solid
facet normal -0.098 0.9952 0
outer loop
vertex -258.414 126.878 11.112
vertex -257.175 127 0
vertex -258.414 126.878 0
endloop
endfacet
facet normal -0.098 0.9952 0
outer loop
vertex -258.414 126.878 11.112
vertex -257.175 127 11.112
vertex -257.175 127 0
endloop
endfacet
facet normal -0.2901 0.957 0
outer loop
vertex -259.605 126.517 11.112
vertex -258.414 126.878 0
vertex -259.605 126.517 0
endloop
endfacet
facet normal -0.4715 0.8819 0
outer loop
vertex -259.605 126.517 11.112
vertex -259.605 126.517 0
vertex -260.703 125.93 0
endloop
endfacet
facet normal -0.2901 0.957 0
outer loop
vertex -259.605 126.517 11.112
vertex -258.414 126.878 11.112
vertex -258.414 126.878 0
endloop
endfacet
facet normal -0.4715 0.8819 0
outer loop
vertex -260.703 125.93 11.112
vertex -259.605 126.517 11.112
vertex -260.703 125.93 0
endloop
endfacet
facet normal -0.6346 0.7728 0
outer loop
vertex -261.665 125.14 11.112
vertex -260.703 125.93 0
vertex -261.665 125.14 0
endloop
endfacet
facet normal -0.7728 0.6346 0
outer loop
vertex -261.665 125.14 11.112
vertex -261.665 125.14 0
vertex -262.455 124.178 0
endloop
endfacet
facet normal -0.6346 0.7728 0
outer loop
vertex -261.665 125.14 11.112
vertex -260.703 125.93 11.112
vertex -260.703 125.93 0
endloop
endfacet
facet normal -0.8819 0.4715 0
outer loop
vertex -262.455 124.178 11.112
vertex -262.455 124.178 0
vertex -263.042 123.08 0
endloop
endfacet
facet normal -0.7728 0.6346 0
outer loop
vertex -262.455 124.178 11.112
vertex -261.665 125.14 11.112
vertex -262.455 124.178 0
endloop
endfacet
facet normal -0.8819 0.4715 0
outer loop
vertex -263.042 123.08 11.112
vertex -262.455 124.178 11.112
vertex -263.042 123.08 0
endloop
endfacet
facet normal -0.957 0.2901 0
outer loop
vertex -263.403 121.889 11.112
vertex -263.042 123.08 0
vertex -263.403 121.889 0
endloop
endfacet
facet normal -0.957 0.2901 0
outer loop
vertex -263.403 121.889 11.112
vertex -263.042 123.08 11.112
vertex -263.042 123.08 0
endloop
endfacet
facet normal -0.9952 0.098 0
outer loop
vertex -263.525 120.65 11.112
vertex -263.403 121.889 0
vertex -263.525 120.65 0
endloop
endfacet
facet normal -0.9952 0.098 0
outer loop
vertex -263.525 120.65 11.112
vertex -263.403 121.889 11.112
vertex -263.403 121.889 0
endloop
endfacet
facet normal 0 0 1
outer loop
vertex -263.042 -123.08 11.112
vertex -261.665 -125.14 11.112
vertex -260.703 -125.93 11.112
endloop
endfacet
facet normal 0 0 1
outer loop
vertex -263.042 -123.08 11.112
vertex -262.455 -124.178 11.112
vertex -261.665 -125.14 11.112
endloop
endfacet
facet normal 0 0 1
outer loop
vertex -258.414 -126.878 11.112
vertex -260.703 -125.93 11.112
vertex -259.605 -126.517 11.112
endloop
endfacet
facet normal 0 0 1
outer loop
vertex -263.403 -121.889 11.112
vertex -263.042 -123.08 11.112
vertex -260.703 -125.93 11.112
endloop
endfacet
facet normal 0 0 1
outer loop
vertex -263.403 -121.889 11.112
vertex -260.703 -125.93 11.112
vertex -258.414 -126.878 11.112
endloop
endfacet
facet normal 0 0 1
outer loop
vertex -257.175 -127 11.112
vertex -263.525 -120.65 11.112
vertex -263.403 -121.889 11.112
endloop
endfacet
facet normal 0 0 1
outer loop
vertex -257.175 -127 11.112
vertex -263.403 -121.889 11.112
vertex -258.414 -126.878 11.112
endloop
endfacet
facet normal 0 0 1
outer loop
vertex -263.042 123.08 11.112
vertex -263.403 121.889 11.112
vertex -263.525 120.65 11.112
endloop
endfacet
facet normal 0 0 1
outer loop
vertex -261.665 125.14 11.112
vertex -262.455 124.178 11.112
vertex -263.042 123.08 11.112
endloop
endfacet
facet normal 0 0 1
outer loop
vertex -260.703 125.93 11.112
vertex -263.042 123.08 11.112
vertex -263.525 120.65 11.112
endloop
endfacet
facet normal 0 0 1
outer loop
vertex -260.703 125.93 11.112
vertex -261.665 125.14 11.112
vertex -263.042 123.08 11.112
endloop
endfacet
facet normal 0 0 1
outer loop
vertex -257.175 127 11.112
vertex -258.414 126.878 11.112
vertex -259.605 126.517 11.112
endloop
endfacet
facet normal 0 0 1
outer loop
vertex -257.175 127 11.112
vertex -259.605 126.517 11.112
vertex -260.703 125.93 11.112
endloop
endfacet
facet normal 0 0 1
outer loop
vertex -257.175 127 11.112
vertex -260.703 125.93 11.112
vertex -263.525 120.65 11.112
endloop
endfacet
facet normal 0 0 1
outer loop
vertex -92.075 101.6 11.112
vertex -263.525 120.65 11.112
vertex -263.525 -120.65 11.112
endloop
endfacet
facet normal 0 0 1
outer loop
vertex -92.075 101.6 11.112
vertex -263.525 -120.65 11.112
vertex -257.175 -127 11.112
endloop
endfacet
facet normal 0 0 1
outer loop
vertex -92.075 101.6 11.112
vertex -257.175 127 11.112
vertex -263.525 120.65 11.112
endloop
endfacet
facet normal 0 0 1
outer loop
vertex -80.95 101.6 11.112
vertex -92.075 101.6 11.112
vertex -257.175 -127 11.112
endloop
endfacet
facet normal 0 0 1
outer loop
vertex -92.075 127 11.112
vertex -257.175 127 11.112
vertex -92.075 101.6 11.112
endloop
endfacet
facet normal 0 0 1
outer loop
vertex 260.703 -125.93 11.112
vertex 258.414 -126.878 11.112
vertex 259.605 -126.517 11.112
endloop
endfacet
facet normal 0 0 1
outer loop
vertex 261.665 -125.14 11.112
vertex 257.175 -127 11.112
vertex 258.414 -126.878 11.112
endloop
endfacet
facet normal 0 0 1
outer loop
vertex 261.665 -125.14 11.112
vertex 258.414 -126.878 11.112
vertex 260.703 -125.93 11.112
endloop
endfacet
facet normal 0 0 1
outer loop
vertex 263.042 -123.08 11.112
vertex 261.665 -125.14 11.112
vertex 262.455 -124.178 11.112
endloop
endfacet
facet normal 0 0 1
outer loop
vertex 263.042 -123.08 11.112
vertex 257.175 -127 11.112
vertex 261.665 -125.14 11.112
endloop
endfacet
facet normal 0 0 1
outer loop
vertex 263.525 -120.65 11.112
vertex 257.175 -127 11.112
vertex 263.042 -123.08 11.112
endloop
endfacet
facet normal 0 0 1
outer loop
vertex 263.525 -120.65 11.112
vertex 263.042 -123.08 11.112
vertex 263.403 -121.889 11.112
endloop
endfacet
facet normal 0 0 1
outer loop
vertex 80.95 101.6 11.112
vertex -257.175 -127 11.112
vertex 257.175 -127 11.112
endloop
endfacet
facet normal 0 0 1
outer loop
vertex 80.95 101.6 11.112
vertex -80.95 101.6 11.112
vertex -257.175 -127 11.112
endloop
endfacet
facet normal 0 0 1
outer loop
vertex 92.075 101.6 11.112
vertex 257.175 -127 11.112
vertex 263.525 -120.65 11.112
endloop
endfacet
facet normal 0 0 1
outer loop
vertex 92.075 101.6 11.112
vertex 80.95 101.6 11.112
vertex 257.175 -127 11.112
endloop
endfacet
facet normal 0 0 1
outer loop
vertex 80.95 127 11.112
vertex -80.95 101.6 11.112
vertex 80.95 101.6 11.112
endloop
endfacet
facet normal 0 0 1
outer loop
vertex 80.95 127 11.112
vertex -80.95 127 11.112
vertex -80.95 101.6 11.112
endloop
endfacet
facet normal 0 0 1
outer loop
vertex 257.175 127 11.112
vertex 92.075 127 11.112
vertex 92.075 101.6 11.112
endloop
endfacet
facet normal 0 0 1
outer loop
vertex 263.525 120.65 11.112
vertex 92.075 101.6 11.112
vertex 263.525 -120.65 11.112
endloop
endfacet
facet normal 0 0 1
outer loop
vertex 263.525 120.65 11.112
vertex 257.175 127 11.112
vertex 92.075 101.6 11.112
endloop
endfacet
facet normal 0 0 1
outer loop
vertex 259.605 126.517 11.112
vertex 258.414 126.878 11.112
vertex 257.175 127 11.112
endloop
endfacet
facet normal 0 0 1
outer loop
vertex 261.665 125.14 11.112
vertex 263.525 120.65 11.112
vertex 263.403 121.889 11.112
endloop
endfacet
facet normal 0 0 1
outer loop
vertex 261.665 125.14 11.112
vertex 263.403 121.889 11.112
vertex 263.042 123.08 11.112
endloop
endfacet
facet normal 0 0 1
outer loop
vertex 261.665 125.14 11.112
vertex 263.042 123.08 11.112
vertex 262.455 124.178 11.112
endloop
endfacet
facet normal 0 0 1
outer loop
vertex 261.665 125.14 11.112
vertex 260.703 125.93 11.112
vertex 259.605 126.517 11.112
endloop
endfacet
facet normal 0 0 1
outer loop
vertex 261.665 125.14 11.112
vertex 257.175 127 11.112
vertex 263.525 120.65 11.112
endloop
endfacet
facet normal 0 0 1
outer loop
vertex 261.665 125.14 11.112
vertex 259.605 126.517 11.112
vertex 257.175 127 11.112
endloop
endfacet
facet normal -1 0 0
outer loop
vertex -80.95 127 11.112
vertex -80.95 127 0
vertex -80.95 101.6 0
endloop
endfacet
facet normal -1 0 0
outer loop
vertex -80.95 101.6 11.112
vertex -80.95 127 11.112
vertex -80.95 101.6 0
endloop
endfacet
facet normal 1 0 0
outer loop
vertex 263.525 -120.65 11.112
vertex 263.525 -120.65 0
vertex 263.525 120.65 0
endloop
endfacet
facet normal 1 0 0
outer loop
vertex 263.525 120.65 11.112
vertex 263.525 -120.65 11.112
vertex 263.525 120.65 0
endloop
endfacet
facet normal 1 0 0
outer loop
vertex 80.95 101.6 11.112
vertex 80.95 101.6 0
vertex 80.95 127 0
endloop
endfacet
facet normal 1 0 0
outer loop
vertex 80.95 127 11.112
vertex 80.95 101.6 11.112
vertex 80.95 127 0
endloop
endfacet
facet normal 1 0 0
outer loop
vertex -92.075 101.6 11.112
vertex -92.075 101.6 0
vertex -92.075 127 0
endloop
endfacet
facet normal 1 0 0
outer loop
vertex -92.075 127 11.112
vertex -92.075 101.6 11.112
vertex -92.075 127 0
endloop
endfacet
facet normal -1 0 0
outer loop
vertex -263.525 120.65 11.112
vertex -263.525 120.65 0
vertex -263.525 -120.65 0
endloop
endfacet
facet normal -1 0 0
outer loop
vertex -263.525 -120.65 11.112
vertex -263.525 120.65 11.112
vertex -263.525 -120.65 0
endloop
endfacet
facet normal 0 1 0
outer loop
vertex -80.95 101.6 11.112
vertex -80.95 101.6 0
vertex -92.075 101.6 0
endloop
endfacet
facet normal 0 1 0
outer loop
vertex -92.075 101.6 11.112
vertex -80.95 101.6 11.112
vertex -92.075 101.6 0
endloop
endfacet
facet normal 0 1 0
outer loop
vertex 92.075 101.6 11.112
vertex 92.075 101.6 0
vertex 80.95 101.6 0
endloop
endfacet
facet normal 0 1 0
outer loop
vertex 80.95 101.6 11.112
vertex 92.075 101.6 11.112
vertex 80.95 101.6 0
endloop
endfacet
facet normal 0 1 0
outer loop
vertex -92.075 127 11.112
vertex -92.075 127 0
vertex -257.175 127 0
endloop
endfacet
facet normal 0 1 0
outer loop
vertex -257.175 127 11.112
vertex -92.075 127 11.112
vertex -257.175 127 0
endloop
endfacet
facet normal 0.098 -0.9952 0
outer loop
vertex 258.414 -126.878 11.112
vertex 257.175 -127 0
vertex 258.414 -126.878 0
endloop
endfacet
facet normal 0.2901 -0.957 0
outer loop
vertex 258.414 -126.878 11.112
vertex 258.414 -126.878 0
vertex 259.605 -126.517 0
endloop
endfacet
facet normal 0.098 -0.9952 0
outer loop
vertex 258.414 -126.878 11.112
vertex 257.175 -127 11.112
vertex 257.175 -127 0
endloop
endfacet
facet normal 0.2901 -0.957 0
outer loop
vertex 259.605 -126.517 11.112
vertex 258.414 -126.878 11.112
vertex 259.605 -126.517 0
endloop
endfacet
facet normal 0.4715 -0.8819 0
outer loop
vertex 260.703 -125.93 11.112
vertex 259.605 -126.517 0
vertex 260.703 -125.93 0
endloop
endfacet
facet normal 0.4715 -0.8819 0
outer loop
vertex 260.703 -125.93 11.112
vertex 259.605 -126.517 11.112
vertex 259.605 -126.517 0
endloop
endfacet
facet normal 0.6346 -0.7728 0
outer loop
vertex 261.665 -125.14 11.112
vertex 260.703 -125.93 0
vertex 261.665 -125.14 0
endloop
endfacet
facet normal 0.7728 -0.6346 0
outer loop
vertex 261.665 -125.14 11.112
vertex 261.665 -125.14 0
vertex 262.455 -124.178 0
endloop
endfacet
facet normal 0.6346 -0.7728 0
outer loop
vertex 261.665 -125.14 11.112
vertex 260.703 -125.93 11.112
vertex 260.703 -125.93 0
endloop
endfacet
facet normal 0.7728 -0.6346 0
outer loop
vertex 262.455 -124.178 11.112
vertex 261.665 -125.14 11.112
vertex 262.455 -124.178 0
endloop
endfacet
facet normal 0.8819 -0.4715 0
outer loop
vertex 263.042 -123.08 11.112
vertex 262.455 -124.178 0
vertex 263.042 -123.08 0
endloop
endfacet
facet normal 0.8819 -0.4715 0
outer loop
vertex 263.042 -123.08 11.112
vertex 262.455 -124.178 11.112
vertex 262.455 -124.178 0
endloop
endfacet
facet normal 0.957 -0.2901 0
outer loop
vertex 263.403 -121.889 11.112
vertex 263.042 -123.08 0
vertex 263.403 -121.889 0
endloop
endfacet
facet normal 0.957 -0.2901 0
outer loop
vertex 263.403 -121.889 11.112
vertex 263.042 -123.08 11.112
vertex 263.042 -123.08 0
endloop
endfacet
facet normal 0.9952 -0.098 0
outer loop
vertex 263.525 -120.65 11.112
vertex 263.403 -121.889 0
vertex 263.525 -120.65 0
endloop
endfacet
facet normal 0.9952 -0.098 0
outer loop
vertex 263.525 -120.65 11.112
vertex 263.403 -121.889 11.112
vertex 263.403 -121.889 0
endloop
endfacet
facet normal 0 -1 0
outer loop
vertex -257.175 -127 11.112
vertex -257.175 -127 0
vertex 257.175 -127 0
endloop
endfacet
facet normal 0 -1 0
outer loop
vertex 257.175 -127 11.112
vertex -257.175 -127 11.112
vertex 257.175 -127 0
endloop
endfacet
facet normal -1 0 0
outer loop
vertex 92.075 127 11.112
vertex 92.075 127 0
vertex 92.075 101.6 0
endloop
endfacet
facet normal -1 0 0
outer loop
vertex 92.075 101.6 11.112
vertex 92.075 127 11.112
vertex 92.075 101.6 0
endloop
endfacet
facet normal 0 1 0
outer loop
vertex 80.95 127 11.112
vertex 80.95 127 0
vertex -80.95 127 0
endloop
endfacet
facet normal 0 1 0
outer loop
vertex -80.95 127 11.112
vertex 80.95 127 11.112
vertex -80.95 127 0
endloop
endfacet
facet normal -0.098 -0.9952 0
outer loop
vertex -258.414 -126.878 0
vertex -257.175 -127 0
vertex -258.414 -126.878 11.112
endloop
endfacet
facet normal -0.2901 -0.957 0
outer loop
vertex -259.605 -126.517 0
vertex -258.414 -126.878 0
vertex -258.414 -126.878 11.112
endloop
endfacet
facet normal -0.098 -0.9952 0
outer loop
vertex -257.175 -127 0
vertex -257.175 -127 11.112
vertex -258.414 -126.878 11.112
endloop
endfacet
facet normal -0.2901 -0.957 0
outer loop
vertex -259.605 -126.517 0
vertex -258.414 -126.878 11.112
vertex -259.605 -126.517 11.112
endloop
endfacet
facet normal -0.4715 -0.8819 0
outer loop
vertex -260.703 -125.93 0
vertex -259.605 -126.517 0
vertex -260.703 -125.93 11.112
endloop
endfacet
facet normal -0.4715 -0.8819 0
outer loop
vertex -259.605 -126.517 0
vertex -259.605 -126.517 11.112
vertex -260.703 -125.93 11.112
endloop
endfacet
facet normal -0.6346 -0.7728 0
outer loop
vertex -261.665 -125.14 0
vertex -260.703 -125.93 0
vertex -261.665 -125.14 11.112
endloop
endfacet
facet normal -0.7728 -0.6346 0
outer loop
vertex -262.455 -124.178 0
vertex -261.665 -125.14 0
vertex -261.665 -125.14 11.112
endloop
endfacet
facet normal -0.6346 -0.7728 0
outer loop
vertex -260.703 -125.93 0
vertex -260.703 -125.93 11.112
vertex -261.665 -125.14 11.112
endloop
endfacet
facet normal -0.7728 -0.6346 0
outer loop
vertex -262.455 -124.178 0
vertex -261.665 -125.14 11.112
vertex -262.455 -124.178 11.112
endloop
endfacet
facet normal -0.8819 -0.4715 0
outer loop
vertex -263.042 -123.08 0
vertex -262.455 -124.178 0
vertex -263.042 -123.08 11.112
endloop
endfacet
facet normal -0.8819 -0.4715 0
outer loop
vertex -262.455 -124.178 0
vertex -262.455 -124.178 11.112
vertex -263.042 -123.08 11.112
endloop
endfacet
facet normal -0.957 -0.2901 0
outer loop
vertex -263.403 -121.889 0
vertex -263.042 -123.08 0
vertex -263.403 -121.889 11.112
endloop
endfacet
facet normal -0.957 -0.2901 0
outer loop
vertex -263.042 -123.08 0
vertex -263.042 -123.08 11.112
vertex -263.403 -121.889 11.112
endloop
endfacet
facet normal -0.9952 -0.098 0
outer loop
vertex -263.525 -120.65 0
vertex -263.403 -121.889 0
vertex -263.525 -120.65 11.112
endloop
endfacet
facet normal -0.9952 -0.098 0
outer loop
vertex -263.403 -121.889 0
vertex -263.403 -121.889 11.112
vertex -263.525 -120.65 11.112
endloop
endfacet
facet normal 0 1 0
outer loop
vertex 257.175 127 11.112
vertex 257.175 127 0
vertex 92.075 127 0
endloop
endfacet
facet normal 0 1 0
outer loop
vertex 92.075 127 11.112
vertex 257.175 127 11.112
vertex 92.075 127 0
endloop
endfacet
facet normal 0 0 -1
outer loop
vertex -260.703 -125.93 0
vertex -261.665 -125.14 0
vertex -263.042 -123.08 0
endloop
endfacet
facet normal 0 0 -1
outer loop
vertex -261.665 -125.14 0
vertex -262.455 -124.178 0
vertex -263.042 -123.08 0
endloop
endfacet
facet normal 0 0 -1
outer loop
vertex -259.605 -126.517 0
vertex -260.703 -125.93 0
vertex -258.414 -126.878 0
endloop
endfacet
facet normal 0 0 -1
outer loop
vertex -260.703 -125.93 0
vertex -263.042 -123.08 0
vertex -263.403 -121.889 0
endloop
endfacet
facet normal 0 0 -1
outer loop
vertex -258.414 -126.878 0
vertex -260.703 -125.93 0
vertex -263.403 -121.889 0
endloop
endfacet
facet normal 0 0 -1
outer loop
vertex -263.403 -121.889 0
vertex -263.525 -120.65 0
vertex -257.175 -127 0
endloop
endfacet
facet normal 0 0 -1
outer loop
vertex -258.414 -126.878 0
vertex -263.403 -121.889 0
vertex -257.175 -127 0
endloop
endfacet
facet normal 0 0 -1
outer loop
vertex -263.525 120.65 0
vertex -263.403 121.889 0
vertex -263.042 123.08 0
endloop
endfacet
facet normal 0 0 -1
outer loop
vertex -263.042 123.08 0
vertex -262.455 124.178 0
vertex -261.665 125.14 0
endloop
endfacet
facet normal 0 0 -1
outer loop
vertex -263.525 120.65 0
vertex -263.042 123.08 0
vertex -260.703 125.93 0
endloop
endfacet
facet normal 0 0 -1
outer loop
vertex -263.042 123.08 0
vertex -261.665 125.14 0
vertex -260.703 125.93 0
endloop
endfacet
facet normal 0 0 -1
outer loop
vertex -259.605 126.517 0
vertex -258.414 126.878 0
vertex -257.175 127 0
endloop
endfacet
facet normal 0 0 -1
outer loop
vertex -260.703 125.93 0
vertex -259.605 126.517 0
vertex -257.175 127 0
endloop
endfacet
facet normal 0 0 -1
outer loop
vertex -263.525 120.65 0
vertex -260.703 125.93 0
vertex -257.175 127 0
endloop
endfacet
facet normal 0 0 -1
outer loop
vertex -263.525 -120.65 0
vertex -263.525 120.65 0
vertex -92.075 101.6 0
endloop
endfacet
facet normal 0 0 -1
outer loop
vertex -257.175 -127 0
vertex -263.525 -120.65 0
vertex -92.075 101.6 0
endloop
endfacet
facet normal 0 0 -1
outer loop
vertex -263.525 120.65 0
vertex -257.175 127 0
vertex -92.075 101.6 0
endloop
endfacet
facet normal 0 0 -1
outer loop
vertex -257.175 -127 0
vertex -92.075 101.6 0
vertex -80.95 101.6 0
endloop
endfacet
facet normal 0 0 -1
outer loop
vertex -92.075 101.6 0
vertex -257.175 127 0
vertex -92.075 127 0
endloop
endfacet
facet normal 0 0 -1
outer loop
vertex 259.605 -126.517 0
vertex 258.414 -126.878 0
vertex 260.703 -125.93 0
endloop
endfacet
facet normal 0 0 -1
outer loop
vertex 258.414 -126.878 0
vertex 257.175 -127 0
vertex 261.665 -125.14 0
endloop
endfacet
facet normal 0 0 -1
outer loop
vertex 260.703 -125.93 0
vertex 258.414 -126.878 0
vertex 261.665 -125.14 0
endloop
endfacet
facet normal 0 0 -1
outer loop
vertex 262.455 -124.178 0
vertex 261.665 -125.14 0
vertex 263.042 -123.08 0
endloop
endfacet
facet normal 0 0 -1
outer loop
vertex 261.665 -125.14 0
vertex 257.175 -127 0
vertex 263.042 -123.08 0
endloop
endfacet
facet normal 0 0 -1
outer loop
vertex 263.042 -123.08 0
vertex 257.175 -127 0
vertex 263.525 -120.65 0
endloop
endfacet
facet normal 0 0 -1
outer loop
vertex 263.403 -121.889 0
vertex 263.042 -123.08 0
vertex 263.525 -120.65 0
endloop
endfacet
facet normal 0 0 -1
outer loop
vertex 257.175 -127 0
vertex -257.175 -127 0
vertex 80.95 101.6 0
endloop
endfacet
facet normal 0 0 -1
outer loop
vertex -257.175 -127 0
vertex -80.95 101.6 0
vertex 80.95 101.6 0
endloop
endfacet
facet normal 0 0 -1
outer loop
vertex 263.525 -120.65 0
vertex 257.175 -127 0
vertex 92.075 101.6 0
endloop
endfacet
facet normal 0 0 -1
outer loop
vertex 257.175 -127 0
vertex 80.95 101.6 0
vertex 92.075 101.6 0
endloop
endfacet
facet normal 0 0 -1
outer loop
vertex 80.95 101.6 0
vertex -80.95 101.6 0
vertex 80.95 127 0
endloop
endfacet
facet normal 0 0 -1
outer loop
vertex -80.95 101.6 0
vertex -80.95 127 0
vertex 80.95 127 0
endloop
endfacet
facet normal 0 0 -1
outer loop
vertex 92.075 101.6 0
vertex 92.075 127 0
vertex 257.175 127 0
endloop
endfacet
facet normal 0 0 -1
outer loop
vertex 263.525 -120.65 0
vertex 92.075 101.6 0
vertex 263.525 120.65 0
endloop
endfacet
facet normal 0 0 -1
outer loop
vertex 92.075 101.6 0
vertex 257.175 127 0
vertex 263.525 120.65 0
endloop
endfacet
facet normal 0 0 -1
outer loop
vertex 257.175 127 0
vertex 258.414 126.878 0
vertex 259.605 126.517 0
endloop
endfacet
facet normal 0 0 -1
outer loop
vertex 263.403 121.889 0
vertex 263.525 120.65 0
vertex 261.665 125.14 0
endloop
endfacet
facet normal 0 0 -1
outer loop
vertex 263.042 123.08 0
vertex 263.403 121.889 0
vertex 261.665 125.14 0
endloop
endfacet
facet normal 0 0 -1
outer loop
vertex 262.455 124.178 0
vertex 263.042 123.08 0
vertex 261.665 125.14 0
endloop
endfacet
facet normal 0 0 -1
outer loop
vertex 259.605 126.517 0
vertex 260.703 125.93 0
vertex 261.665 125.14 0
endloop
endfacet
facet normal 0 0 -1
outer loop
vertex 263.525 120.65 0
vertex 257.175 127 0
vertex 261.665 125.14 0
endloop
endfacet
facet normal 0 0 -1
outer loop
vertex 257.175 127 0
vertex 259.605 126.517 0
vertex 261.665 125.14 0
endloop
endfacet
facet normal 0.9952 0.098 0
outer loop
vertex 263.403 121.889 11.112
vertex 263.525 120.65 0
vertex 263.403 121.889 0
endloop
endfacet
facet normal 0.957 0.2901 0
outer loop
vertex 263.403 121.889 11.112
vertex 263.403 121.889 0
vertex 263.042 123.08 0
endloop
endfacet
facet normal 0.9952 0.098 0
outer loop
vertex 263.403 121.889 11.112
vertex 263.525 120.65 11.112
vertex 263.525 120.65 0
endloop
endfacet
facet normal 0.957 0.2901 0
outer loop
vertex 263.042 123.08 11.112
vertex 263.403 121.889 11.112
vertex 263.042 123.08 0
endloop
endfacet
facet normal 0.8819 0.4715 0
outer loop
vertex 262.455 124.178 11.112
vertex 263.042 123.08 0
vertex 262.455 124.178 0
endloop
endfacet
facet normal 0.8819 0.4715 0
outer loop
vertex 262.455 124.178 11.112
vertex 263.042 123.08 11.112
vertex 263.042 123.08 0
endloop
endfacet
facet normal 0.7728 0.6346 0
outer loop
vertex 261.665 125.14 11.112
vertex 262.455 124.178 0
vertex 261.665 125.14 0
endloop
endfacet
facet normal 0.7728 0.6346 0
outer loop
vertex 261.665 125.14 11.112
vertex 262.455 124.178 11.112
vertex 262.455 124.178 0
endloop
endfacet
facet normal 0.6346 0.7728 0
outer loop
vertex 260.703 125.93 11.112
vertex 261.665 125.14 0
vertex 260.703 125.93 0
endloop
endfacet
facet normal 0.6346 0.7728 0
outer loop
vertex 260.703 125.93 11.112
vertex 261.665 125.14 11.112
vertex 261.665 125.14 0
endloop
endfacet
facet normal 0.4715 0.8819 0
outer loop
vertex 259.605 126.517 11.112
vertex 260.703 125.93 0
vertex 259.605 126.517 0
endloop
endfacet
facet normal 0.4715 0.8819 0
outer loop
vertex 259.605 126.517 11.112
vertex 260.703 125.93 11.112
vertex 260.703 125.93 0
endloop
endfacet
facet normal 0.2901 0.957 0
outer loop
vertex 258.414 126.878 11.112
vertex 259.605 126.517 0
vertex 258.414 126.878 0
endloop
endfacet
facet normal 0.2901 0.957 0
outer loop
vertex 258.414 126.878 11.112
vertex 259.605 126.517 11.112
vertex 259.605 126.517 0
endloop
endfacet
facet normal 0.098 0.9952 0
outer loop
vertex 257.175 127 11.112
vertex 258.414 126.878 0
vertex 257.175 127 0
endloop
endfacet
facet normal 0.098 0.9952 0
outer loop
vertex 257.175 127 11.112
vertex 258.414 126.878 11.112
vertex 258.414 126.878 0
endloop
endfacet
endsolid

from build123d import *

# Parameters (mm, degrees)
F1_DEPTH = 11.1125
F2_R     = 6.35


# Not quite as in the source:
# - a feature names something its author has since deleted; it is built from what else it names


with BuildPart() as f1:
    # F0 (on Top) → F1 (new body)
    with BuildSketch(Plane.XY):
        Polygon((-263.525, -101.6), (-263.525, -127), (80.9498, -127), (92.075, -127), (263.525, -127), (263.525, -101.6), (263.525, 127), (92.075, 127), (92.075, 101.6), (80.9498, 101.6), (80.9498, 127), (-80.9498, 127), (-80.9498, 101.6), (-92.075, 101.6), (-92.075, 127), (-263.525, 127), align=None)
    extrude(amount=F1_DEPTH)

    # F2
    f2_edges = [f1.edges().sort_by_distance(p)[0] for p in [
        (263.525, -127, 5.55625),
        (263.525, 127, 5.55625),
        (-263.525, -127, 5.55625),
        (-263.525, 127, 5.55625),
    ]]
    fillet(f2_edges, radius=F2_R)


solid = f1.part
